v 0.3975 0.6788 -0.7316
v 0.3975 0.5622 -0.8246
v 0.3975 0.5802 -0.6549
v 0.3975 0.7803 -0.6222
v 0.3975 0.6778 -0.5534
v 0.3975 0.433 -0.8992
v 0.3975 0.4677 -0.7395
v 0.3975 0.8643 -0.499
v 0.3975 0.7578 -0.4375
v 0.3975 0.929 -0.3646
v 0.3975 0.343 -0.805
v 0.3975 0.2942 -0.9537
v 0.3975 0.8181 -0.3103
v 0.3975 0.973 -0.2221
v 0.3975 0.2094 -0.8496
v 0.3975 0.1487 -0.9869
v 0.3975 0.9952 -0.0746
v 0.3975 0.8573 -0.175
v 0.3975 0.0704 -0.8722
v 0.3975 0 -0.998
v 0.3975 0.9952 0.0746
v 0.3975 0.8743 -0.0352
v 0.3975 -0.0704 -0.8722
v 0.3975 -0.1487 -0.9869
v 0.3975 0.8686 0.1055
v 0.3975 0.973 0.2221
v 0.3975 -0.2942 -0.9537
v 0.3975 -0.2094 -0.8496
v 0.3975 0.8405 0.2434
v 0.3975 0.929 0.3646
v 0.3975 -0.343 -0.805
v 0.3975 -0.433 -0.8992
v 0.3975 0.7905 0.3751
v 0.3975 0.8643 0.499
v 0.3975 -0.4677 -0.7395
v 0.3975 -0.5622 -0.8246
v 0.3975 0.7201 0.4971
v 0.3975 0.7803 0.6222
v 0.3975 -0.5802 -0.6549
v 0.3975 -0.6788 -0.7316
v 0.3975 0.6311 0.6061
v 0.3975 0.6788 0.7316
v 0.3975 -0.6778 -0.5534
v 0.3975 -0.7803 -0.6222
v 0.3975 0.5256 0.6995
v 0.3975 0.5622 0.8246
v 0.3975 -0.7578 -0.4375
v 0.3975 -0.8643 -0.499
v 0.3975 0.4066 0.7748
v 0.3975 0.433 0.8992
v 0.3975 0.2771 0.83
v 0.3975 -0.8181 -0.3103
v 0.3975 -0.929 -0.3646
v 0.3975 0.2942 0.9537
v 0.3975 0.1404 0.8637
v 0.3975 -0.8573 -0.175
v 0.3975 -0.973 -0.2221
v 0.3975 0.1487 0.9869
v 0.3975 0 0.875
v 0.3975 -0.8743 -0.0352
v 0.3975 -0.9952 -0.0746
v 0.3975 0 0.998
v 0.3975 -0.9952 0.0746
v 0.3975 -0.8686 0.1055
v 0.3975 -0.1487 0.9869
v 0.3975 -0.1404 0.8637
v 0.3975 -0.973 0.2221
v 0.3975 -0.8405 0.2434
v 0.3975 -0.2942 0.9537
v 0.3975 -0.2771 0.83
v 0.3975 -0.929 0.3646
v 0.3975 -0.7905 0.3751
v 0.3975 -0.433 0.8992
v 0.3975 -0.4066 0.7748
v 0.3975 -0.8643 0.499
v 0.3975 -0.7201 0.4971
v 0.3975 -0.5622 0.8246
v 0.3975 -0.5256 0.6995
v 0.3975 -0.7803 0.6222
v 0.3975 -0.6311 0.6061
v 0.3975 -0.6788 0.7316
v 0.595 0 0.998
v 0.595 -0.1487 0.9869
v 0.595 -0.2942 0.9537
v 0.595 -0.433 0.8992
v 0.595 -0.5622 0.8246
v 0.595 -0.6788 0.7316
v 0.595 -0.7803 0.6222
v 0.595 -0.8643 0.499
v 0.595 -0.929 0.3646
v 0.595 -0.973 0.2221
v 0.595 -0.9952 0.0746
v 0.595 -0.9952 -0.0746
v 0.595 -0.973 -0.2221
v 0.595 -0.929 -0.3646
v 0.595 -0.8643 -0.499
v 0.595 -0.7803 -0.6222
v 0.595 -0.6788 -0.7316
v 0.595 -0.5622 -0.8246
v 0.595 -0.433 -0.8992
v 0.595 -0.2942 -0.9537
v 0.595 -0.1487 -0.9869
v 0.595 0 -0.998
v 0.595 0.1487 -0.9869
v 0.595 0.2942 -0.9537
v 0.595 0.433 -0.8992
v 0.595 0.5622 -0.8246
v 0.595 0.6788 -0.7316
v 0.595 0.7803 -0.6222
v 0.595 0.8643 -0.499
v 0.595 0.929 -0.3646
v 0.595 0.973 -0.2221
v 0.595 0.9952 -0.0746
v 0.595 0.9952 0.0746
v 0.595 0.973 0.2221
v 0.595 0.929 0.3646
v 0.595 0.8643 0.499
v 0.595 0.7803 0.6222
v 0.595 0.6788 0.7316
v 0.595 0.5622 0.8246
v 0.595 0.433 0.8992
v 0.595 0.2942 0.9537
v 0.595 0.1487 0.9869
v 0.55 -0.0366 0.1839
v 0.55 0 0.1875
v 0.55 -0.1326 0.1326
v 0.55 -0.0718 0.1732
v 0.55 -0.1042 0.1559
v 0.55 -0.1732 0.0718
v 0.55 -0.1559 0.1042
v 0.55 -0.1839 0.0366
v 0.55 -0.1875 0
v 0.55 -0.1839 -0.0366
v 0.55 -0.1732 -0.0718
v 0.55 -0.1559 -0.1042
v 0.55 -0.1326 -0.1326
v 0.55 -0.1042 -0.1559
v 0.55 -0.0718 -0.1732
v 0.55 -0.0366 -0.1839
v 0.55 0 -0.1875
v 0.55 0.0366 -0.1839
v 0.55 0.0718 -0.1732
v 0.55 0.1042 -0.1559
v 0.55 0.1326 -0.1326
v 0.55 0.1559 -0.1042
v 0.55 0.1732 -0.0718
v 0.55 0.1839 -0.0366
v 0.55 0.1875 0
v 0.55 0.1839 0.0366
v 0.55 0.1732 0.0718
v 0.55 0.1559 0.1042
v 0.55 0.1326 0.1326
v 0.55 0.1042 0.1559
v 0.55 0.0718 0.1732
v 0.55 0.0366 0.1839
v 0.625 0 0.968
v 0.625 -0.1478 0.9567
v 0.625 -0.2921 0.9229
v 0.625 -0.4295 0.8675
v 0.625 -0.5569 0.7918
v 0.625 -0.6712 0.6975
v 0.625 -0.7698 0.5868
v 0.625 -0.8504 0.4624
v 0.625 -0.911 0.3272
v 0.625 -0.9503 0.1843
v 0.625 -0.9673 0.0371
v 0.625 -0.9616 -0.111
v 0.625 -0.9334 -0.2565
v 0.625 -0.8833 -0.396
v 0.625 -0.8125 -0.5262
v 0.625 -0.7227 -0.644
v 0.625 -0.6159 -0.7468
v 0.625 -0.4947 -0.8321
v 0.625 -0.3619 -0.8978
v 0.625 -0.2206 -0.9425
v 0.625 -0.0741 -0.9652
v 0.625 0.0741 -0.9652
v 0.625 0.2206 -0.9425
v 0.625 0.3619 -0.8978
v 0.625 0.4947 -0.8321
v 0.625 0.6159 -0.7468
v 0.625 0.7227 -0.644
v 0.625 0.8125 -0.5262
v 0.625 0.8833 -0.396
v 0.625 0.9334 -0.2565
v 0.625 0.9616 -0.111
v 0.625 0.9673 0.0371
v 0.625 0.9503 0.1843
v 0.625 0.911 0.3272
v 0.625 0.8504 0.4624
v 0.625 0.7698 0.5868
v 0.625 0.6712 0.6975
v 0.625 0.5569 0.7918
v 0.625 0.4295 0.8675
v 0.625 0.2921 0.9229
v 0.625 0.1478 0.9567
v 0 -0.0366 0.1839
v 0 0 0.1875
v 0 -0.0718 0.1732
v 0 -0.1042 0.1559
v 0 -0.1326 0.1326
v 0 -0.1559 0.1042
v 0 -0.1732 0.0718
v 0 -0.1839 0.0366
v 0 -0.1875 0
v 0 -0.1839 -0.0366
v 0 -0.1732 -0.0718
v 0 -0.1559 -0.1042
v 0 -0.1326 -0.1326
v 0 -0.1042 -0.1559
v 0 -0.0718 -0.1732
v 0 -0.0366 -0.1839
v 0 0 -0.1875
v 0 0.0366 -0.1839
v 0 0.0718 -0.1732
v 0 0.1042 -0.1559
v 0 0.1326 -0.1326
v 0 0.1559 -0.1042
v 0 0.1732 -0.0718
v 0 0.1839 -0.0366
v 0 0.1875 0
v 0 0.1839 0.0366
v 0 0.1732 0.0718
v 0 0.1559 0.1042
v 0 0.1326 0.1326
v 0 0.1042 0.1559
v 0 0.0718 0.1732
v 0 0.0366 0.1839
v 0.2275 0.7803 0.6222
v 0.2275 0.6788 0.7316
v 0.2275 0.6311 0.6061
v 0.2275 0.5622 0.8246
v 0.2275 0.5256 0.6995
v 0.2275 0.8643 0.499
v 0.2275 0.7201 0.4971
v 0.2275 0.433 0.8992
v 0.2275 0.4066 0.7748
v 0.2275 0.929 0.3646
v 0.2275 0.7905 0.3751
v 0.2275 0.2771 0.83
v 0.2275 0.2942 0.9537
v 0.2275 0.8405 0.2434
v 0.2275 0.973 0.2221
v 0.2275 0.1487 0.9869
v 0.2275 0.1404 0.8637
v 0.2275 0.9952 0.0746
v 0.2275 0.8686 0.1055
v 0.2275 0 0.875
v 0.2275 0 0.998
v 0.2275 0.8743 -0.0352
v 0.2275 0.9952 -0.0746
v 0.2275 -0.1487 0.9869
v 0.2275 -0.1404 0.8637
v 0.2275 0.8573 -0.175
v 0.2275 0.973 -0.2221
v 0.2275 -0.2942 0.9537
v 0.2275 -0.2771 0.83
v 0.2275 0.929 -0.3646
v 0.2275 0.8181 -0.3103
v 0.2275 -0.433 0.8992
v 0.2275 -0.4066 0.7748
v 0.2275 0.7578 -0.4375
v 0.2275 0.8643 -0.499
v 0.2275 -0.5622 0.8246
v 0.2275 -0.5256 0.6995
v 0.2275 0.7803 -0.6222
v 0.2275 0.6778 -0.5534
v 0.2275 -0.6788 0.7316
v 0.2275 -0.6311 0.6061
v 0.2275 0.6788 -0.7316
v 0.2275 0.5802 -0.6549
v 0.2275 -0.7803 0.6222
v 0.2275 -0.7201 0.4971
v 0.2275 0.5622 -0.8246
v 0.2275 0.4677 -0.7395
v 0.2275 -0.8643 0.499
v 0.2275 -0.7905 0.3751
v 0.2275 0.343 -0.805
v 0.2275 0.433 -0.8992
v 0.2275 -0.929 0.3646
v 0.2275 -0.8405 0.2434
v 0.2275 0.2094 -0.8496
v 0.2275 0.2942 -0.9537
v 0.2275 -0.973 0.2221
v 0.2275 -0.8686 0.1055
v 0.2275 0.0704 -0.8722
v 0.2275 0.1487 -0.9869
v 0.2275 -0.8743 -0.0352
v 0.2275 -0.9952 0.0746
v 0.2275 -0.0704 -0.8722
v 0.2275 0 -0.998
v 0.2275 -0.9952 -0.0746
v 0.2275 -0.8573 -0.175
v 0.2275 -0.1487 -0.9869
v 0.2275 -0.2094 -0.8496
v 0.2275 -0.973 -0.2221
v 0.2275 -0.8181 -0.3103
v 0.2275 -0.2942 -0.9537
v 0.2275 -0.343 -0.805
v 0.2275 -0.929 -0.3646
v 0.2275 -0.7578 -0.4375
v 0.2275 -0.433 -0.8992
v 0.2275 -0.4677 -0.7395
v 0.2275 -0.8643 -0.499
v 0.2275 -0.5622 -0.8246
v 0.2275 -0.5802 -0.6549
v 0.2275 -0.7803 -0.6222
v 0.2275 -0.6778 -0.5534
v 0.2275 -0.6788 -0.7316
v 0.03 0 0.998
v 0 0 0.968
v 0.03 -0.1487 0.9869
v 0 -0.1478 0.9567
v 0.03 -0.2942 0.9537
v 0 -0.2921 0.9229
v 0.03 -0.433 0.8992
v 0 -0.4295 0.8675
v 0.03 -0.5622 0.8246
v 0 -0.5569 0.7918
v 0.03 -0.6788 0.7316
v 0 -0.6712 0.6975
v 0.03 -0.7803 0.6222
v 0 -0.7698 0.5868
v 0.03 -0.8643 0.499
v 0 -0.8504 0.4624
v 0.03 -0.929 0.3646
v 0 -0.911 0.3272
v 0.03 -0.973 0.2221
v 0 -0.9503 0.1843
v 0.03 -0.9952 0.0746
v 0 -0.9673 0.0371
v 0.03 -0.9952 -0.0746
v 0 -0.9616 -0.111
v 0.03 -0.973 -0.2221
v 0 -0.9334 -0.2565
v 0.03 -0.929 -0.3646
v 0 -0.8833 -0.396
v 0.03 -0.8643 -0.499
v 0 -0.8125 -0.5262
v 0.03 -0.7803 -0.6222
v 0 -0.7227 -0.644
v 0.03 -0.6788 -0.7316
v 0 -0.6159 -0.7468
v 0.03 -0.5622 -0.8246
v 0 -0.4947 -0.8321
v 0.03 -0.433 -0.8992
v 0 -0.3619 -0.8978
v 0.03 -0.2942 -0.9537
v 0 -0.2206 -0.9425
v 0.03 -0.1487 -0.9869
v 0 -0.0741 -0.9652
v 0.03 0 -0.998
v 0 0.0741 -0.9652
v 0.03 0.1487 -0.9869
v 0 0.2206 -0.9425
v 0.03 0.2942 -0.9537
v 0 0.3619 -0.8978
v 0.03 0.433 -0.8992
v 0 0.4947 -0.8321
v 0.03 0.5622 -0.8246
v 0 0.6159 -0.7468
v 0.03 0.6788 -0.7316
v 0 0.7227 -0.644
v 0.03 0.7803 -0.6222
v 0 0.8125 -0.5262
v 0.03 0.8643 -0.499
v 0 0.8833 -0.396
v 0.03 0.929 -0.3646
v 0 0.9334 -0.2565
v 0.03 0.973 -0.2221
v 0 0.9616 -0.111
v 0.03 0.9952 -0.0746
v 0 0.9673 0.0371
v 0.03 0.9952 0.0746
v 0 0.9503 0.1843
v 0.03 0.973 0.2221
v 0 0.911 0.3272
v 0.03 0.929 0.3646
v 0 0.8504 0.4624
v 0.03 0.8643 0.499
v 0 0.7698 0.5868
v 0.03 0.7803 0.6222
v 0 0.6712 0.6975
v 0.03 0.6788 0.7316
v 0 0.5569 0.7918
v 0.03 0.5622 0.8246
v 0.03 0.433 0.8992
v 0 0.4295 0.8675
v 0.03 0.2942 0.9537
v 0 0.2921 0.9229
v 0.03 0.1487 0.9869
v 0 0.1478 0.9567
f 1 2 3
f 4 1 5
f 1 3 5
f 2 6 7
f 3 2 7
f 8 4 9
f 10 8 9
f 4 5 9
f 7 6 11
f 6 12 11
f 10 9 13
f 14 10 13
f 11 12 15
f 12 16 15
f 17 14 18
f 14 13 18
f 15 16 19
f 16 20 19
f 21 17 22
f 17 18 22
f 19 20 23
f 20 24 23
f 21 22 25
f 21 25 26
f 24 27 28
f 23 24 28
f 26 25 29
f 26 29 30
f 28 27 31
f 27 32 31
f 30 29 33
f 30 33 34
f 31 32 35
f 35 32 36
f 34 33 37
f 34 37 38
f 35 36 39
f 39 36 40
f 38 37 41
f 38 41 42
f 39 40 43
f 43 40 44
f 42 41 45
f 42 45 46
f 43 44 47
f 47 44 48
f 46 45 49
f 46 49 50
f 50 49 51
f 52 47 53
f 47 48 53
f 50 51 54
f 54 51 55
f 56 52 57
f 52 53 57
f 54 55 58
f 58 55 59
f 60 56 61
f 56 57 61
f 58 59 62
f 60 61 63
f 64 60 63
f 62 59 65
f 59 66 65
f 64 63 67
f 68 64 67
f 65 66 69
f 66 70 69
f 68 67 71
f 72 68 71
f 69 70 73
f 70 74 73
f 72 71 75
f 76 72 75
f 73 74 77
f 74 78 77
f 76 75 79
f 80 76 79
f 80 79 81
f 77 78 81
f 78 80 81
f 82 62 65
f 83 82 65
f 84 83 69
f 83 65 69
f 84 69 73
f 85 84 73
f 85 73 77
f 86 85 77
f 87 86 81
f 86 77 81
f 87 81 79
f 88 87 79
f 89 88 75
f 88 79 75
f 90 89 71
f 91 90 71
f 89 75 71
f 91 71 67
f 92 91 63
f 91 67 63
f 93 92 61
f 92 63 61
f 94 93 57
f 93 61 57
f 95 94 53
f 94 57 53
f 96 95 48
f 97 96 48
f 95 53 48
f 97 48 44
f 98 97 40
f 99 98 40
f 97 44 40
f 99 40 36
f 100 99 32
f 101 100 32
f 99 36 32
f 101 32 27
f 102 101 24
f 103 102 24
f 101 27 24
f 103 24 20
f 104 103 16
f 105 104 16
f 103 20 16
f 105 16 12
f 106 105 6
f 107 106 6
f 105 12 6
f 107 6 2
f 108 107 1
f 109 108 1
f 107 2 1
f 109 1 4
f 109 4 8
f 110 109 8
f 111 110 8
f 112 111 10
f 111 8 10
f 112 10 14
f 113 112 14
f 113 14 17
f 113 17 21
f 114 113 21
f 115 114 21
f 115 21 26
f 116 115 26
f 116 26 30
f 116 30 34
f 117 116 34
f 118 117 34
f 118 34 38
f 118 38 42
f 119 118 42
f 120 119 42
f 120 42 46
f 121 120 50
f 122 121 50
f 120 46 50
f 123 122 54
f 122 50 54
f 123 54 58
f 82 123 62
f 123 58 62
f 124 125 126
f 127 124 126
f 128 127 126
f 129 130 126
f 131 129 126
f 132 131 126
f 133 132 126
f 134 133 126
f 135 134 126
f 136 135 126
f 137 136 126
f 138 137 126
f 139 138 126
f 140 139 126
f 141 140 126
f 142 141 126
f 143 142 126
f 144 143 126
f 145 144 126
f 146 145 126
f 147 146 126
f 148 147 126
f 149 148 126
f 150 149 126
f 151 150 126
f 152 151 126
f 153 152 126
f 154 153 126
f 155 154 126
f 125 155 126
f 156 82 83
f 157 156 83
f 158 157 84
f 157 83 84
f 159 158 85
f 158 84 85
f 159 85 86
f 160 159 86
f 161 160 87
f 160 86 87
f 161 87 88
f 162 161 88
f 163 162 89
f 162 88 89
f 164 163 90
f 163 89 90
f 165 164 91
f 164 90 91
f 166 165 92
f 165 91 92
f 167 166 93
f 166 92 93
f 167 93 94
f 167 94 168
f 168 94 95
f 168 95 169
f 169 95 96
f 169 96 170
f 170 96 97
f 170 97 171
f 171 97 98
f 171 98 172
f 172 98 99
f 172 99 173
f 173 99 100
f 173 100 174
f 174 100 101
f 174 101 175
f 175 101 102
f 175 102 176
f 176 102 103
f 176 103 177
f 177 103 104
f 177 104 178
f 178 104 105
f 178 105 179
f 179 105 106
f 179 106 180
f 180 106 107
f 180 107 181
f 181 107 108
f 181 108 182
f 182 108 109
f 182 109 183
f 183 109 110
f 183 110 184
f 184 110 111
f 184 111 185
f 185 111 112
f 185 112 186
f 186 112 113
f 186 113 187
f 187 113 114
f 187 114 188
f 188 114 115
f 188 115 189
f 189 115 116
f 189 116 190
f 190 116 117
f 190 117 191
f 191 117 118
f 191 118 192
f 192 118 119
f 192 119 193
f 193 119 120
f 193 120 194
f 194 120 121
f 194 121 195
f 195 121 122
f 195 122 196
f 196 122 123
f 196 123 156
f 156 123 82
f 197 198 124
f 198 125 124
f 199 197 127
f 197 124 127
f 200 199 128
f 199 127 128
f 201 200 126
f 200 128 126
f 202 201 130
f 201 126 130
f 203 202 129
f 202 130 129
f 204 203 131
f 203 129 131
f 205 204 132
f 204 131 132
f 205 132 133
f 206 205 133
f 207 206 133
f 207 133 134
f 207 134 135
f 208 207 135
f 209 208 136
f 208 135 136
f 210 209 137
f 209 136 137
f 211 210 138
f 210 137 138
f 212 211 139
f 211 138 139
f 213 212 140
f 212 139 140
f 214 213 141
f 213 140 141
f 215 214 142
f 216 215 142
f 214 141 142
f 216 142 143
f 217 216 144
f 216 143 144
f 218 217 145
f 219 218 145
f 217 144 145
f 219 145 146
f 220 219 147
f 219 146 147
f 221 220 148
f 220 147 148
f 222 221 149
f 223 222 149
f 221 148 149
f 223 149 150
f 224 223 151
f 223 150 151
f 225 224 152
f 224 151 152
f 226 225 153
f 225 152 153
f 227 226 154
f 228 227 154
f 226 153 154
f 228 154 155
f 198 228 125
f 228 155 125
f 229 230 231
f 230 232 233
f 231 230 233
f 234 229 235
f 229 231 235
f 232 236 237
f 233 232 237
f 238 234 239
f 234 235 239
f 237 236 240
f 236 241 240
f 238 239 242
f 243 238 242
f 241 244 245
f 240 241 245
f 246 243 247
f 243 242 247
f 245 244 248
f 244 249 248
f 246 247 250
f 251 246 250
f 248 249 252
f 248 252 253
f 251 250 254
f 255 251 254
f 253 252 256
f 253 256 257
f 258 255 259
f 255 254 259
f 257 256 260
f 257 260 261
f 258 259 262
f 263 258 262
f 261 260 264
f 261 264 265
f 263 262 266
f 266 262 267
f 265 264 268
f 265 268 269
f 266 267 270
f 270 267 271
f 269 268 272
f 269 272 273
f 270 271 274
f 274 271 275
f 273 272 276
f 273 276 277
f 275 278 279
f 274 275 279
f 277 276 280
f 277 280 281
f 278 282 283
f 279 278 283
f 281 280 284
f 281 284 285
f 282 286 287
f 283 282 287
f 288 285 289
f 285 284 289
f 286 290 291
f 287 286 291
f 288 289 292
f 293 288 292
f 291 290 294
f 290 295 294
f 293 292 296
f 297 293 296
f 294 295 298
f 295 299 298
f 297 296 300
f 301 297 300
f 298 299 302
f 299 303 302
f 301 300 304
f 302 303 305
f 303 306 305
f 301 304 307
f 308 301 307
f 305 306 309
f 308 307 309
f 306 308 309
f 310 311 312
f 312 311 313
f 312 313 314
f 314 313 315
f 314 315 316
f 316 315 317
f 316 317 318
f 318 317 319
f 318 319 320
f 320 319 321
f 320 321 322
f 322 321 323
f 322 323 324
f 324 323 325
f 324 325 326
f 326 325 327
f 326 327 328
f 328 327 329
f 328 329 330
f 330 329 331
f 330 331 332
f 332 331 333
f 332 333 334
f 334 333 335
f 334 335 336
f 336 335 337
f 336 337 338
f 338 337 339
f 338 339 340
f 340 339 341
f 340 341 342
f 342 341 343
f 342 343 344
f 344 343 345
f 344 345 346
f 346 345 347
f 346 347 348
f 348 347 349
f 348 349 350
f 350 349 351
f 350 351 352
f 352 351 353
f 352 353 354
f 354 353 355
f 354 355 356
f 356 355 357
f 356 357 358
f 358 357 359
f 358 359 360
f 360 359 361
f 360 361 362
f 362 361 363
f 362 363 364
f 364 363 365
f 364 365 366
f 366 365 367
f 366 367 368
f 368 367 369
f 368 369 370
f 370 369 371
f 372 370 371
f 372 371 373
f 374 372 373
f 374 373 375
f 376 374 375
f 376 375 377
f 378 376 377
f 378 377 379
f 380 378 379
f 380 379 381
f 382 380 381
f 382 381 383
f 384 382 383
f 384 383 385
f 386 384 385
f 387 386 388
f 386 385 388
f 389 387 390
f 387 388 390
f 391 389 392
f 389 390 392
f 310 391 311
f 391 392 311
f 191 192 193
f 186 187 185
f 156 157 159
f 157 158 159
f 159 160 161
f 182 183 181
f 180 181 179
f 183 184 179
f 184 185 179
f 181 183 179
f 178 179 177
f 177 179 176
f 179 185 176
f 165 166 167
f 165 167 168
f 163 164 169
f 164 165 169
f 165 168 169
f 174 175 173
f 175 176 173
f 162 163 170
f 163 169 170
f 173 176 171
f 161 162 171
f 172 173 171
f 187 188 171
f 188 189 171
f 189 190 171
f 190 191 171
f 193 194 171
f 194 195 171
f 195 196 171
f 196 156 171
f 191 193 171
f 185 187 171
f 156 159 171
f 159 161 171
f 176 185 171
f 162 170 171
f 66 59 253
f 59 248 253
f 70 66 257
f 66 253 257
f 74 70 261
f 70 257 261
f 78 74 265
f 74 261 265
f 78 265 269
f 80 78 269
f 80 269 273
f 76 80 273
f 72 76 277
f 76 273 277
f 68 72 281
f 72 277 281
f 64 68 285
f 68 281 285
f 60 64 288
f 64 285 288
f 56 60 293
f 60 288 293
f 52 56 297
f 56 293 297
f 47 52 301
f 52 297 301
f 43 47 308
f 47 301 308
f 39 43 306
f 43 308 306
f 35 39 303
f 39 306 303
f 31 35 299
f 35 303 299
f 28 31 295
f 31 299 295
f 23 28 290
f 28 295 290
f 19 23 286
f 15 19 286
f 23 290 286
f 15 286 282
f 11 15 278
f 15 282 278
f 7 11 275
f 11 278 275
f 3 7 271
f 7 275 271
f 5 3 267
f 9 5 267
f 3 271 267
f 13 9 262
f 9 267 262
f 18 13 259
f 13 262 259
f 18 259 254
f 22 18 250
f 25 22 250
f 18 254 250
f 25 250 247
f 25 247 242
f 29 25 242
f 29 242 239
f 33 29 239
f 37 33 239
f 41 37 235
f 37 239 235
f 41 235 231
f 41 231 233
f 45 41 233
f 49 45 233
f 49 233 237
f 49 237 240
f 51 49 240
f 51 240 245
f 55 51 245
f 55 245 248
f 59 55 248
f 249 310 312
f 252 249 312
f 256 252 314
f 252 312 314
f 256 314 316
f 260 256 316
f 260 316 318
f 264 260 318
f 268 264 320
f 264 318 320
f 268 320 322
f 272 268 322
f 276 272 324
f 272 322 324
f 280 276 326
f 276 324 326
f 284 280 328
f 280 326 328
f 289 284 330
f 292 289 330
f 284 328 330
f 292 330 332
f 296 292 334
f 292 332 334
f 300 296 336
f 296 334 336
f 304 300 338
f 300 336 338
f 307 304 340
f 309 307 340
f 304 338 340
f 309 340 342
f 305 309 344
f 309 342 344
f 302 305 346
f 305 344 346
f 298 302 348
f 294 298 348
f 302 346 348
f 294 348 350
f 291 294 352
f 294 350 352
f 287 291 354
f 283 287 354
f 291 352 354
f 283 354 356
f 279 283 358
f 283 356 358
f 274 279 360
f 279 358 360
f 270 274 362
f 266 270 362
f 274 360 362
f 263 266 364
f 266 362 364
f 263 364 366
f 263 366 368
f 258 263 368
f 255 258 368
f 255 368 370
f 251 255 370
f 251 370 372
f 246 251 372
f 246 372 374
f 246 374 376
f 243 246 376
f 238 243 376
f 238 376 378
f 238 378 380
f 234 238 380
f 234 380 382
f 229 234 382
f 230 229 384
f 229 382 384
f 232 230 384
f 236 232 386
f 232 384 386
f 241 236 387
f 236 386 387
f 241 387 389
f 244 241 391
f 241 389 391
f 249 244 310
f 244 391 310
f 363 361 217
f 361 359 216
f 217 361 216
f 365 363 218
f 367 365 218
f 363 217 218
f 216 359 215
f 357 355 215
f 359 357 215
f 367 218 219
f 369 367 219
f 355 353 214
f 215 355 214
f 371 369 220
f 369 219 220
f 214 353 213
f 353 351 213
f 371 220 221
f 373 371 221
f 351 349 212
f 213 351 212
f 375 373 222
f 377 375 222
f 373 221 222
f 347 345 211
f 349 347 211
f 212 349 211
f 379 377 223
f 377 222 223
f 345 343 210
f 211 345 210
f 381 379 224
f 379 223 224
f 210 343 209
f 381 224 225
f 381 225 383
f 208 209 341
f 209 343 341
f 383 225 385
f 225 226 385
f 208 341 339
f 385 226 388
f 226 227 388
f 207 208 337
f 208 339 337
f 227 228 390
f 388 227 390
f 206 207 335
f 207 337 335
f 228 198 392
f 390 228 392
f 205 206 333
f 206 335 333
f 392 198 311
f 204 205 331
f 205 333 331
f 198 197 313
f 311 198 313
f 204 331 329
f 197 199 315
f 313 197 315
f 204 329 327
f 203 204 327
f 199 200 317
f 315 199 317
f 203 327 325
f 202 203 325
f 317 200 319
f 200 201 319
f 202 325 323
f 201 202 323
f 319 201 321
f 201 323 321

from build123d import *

# Parameters (mm, degrees)
CHAFL_N1_SIZE = 0.03


with BuildPart() as part:
    # Croquis1 → Revolución1 (revolve)
    with BuildSketch(Plane.XY, mode=Mode.PRIVATE) as revoluci_n1_sk:
        Polygon((0, 0.1875), (0.55, 0.1875), (0.55, 0.1), (0.55, 0), (0.625, 0), (0.625, 0.998), (0.3975, 0.998), (0.3975, 0.875), (0.2275, 0.875), (0.2275, 0.998), (0, 0.998), align=None)
    revolve(revoluci_n1_sk.sketch.rotate(Axis((0, 0, 0), (1, 0, 0)), 90), axis=Axis((0, 0, 0), (1, 0, 0)))

    # Chaflán1
    chafl_n1_edges = [part.edges().sort_by_distance(p)[0] for p in [
        (0, 0, -0.998),
        (0.625, 0, -0.998),
    ]]
    chamfer(chafl_n1_edges, length=CHAFL_N1_SIZE)


solid = part.part
